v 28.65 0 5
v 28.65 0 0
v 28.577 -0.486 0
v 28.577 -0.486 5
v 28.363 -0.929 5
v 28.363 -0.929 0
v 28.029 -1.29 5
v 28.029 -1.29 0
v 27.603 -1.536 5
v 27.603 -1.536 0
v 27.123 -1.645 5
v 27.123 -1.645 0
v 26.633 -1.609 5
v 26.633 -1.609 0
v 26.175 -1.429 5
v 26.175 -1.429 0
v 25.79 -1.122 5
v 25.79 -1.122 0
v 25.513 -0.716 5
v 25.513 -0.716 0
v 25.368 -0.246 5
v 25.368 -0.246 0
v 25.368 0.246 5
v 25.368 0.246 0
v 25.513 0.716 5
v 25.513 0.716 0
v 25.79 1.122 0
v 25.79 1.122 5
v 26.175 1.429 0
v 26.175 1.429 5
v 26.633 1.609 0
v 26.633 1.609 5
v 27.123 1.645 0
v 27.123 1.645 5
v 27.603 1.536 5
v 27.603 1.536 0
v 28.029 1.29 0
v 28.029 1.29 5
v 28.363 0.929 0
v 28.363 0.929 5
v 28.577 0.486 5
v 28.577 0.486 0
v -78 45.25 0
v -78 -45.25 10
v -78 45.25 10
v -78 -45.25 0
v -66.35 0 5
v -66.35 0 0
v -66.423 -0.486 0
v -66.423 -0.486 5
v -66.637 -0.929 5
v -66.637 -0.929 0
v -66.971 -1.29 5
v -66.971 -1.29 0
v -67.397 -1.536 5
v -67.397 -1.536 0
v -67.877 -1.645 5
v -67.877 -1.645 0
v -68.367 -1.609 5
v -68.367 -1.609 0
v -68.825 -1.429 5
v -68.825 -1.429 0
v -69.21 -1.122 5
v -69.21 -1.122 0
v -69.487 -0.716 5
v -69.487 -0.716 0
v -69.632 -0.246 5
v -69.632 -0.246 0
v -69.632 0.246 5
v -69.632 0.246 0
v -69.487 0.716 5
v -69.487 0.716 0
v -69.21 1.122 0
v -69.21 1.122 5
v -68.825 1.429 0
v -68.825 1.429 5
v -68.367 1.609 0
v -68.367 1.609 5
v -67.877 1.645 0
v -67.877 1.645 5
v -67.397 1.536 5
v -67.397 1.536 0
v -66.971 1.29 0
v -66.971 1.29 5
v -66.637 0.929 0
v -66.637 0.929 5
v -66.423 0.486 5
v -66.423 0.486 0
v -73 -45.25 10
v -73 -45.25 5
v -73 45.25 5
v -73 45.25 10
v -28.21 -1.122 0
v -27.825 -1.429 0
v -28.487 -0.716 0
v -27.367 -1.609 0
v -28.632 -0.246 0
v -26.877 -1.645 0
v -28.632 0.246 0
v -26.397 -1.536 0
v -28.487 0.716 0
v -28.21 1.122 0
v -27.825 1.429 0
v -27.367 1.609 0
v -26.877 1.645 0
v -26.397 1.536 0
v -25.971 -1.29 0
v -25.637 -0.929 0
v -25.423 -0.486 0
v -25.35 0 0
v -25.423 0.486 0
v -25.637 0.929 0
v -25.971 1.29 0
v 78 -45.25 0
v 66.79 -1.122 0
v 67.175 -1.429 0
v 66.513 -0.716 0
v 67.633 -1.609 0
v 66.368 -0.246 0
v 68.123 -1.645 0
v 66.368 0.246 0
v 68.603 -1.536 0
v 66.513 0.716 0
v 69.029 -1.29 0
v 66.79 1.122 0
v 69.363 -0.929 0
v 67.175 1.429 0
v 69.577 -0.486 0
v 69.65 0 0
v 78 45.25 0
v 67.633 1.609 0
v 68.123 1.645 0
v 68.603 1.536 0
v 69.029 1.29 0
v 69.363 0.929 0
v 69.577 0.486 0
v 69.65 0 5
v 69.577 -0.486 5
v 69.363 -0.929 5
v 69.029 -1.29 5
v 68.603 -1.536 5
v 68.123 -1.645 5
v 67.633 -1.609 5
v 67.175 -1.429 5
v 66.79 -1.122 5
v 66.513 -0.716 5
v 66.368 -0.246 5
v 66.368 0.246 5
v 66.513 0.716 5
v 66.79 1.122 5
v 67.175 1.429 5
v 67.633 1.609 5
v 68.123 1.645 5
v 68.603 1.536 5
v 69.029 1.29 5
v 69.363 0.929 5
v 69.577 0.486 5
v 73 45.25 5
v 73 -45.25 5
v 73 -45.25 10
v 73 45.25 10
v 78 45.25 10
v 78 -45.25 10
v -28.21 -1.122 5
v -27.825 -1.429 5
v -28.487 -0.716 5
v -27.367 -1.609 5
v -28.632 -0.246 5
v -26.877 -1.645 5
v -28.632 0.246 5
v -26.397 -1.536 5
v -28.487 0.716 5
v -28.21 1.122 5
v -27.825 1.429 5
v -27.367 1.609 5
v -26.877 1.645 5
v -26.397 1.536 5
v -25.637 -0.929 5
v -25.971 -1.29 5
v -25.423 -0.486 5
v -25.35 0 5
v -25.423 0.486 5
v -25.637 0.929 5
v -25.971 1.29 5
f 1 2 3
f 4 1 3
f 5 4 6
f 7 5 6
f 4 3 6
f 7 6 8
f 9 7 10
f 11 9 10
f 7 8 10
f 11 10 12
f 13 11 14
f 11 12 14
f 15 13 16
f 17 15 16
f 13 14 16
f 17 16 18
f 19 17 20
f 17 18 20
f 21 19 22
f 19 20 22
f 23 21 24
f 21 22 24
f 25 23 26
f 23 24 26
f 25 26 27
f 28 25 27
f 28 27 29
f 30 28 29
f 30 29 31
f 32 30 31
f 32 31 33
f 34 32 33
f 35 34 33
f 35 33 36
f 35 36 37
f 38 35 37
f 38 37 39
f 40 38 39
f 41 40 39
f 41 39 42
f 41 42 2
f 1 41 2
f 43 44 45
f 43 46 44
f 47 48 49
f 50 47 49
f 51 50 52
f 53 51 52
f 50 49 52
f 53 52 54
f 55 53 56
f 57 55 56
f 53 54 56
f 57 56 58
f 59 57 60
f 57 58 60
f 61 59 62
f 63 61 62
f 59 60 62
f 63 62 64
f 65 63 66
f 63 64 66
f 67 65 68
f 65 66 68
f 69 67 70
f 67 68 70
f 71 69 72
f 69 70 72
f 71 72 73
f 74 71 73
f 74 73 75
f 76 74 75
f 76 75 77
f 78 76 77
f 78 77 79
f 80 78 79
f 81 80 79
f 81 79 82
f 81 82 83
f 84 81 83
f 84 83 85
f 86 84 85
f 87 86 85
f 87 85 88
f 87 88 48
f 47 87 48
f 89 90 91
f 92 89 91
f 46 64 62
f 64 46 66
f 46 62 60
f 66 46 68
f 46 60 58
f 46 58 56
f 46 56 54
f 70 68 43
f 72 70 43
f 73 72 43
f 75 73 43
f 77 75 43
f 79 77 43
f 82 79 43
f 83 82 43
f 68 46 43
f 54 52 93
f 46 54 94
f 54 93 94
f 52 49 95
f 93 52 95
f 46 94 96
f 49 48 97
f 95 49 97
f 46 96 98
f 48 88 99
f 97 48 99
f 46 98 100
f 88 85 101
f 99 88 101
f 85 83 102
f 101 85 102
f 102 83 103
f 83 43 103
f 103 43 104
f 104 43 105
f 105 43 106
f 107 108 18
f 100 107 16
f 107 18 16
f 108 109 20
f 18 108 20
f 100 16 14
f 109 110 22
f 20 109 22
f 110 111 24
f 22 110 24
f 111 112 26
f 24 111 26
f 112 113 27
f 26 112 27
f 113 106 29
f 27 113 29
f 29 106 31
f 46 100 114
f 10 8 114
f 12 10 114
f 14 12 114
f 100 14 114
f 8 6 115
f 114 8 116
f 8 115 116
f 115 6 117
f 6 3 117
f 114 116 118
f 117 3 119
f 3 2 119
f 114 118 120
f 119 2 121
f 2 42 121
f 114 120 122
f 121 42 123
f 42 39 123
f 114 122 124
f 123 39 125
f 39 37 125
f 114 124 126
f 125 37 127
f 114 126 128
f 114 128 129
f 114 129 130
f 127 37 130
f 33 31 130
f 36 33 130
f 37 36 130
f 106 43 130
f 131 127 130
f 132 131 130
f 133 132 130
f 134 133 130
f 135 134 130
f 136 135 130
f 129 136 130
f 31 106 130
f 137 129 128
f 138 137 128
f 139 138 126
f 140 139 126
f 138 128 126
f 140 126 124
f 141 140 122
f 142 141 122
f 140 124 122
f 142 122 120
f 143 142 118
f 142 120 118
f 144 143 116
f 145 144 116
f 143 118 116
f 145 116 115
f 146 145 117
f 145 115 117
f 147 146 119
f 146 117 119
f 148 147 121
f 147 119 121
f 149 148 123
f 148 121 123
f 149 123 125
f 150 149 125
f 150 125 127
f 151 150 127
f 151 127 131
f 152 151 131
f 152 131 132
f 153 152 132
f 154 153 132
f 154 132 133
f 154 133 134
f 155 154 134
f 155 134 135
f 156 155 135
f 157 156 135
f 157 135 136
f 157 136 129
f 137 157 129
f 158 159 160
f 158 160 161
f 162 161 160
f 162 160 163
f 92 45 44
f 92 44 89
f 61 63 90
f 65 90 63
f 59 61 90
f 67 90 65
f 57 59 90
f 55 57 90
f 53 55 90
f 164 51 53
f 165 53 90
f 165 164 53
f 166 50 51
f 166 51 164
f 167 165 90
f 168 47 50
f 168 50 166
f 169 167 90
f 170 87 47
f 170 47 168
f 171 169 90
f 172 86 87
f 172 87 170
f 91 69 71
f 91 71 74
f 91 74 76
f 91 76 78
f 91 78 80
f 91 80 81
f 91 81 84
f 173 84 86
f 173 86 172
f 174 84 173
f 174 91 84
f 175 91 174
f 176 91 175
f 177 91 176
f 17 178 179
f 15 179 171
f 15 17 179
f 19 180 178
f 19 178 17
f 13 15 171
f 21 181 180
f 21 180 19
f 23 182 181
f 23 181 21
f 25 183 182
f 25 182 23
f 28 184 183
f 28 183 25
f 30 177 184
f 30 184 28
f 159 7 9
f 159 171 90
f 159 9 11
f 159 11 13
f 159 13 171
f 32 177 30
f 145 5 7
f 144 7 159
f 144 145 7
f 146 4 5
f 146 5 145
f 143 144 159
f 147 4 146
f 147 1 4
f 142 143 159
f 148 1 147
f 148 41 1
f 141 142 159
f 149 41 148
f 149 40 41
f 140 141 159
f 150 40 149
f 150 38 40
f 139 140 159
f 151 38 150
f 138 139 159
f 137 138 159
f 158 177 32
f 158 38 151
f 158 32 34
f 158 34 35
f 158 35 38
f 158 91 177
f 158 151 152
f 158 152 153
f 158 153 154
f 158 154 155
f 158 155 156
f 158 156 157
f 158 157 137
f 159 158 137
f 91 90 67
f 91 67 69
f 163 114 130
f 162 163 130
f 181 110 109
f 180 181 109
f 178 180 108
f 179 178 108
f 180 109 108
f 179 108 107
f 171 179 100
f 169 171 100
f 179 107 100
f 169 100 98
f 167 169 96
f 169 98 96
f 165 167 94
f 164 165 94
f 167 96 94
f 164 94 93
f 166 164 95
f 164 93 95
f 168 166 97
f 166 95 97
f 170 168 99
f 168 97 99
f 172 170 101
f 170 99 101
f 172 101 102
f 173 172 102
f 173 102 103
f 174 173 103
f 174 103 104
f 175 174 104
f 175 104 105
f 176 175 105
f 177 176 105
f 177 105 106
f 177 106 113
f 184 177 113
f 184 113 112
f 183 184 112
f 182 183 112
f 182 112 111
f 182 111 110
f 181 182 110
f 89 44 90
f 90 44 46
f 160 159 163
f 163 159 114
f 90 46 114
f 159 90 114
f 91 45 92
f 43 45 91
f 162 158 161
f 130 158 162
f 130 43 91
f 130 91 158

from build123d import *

# Parameters (mm, degrees)
F0_W     = 5
F0_H     = 90.5
F0_W_2   = 146
F1_DEPTH = 5
F2_W     = 5
F2_H     = 90.5
F3_DEPTH = 5
F4_R     = 1.65
F5_DEPTH = 10.001


with BuildPart() as f1:
    # F0 (on Top) → F1 (new body)
    with BuildSketch(Plane.XY):
        with Locations((75.5, 0)):
            Rectangle(F0_W, F0_H)
        Rectangle(F0_W_2, F0_H)
        with Locations((-75.5, 0)):
            Rectangle(F0_W, F0_H)
    extrude(amount=F1_DEPTH)

    # F2 (on face) → F3 (join)
    with BuildSketch(Plane.XY.offset(5)):
        with Locations((-75.5, 0)):
            Rectangle(F2_W, F2_H)
        with Locations((75.5, 0)):
            Rectangle(F2_W, F2_H)
    extrude(amount=F3_DEPTH)

    # F4 (on face) → F5 (cut, through all)
    with BuildSketch(Plane(origin=(0, 0, 0), x_dir=(1, 0, 0), z_dir=(0, 0, -1))):
        with Locations((-68, 0)):
            Circle(F4_R)
        with Locations((-27, 0)):
            Circle(F4_R)
        with Locations((27, 0)):
            Circle(F4_R)
        with Locations((68, 0)):
            Circle(F4_R)
    extrude(amount=-F5_DEPTH, mode=Mode.SUBTRACT)


solid = f1.part
